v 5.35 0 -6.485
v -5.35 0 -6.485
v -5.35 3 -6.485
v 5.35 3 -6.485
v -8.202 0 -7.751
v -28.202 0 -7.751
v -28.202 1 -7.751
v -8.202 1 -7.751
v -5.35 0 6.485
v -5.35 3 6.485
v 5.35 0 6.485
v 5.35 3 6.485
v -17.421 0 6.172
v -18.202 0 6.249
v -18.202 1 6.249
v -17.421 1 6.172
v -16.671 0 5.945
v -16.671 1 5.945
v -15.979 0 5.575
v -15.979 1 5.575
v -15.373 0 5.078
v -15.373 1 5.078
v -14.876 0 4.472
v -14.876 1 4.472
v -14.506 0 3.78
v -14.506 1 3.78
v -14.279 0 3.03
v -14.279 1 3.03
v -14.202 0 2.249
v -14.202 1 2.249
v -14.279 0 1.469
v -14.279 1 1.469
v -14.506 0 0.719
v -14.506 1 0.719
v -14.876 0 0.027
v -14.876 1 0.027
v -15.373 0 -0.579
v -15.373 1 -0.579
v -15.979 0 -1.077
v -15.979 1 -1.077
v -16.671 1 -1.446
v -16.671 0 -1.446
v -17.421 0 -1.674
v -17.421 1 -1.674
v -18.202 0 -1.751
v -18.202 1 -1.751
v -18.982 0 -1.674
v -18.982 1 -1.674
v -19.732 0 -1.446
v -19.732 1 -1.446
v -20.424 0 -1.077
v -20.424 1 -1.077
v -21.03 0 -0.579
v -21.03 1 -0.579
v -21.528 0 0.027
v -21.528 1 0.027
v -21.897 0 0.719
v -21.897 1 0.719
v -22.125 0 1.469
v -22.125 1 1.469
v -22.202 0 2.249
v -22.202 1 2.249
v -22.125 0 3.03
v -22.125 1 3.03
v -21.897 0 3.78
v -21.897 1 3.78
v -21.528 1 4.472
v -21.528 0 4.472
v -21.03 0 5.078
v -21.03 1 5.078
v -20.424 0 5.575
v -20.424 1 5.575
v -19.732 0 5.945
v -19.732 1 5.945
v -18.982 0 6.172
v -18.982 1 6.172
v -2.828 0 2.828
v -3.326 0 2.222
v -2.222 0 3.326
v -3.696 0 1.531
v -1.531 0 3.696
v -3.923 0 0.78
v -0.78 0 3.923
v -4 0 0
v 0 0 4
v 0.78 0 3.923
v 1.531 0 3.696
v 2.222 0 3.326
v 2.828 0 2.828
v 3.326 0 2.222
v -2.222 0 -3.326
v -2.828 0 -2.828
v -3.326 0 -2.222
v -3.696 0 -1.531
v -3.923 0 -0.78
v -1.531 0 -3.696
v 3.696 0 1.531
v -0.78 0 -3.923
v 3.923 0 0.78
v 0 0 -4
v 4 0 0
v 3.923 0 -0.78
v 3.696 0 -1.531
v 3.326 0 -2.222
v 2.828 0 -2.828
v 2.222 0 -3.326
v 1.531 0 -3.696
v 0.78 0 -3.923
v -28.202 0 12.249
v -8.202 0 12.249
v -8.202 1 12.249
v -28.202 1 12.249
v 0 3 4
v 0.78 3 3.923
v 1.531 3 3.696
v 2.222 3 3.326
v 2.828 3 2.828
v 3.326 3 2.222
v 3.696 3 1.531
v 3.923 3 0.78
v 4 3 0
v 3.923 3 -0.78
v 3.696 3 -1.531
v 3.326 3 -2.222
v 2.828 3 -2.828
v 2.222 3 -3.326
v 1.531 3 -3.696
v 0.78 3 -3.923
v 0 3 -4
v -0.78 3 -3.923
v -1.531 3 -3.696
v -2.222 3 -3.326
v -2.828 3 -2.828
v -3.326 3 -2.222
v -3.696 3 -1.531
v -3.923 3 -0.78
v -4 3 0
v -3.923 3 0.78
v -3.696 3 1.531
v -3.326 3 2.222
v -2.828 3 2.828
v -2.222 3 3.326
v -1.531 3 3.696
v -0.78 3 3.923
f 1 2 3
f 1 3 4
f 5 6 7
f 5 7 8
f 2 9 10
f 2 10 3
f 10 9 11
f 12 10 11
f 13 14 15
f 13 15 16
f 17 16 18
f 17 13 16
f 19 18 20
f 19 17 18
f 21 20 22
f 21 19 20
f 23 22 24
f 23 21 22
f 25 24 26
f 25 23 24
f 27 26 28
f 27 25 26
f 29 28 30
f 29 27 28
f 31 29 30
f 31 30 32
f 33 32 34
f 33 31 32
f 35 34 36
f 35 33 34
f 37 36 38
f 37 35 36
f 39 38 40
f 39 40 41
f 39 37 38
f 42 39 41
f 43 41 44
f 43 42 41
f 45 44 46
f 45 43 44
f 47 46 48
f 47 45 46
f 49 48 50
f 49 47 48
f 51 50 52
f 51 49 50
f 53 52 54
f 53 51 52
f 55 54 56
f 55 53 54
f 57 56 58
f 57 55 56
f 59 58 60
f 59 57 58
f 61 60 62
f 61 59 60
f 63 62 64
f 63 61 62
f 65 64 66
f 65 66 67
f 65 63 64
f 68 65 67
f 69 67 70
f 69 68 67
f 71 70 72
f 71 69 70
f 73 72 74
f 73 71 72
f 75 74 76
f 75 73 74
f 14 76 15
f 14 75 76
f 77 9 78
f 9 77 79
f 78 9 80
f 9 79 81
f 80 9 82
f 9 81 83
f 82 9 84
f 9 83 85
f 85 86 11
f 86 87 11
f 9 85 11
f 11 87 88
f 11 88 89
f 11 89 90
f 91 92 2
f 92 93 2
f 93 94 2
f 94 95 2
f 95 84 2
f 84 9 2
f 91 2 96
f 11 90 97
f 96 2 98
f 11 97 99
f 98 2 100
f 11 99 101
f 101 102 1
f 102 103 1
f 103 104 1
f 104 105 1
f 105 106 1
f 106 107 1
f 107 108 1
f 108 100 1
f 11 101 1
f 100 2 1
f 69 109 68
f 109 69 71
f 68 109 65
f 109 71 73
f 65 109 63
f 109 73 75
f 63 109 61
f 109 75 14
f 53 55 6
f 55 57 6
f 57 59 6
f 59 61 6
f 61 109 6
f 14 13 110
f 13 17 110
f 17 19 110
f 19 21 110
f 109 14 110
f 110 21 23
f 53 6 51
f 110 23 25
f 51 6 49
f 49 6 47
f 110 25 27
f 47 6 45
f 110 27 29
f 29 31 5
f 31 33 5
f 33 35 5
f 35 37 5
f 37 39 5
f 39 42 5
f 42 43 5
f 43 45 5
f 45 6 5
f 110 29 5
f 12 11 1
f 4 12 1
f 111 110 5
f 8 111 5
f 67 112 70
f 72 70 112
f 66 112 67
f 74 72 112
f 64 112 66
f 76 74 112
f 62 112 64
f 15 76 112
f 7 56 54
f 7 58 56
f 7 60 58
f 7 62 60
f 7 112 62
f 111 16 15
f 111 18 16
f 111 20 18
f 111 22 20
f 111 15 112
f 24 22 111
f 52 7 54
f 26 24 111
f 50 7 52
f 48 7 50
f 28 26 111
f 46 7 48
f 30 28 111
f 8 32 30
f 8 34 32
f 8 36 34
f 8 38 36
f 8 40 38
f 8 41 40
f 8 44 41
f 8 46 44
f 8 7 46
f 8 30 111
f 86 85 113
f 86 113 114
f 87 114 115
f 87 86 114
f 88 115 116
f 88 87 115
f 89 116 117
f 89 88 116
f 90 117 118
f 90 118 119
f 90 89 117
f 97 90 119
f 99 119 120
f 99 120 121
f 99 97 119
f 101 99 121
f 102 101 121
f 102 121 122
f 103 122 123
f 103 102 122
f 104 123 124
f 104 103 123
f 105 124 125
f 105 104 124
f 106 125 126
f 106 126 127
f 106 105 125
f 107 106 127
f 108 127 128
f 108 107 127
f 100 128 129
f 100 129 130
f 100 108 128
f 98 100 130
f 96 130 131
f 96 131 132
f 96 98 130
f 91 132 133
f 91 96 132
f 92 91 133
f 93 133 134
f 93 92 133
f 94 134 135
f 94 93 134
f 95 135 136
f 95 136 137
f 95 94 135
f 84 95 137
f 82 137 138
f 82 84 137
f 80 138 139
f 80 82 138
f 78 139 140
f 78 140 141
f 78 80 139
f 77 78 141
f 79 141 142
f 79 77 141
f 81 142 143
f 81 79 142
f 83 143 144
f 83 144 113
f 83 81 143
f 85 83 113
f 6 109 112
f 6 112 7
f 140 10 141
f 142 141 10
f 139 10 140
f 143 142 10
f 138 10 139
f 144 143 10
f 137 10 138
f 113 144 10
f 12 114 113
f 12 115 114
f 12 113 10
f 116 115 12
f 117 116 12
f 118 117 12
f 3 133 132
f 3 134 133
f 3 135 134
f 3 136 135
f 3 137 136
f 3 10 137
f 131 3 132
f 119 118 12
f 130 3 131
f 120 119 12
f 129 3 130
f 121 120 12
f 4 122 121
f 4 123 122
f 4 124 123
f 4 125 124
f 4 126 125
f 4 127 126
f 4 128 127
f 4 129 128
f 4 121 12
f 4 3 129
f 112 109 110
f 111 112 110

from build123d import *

# Parameters (mm, degrees)
SKETCH1_W           = 10.7
SKETCH1_H           = 12.97
SKETCH1_R           = 4
BOSS_EXTRUDE1_DEPTH = 3
SKETCH2_W           = 20
SKETCH2_H           = 20
SKETCH2_R           = 4
BOSS_EXTRUDE2_DEPTH = 1


with BuildPart() as part:
    # Sketch1 → Boss-Extrude1 (new body)
    with BuildSketch(Plane(origin=(0, 0, 0), x_dir=(1, 0, 0), z_dir=(0, 1, 0))):
        Rectangle(SKETCH1_W, SKETCH1_H)
        with Locations(Location((0, 0, 0), (0, 0, 270))):
            Circle(SKETCH1_R, mode=Mode.SUBTRACT)
    extrude(amount=BOSS_EXTRUDE1_DEPTH)


with BuildPart() as body_2:
    # Sketch2 → Boss-Extrude2 (new body)
    with BuildSketch(Plane(origin=(0, 0, 0), x_dir=(1, 0, 0), z_dir=(0, 1, 0))):
        with Locations((-18.201727798, -2.249298379)):
            Rectangle(SKETCH2_W, SKETCH2_H)
        with Locations(Location((-18.201727798, -2.249298379, 0), (0, 0, 270))):
            Circle(SKETCH2_R, mode=Mode.SUBTRACT)
    extrude(amount=BOSS_EXTRUDE2_DEPTH)


solid = Compound([part.part, body_2.part])
